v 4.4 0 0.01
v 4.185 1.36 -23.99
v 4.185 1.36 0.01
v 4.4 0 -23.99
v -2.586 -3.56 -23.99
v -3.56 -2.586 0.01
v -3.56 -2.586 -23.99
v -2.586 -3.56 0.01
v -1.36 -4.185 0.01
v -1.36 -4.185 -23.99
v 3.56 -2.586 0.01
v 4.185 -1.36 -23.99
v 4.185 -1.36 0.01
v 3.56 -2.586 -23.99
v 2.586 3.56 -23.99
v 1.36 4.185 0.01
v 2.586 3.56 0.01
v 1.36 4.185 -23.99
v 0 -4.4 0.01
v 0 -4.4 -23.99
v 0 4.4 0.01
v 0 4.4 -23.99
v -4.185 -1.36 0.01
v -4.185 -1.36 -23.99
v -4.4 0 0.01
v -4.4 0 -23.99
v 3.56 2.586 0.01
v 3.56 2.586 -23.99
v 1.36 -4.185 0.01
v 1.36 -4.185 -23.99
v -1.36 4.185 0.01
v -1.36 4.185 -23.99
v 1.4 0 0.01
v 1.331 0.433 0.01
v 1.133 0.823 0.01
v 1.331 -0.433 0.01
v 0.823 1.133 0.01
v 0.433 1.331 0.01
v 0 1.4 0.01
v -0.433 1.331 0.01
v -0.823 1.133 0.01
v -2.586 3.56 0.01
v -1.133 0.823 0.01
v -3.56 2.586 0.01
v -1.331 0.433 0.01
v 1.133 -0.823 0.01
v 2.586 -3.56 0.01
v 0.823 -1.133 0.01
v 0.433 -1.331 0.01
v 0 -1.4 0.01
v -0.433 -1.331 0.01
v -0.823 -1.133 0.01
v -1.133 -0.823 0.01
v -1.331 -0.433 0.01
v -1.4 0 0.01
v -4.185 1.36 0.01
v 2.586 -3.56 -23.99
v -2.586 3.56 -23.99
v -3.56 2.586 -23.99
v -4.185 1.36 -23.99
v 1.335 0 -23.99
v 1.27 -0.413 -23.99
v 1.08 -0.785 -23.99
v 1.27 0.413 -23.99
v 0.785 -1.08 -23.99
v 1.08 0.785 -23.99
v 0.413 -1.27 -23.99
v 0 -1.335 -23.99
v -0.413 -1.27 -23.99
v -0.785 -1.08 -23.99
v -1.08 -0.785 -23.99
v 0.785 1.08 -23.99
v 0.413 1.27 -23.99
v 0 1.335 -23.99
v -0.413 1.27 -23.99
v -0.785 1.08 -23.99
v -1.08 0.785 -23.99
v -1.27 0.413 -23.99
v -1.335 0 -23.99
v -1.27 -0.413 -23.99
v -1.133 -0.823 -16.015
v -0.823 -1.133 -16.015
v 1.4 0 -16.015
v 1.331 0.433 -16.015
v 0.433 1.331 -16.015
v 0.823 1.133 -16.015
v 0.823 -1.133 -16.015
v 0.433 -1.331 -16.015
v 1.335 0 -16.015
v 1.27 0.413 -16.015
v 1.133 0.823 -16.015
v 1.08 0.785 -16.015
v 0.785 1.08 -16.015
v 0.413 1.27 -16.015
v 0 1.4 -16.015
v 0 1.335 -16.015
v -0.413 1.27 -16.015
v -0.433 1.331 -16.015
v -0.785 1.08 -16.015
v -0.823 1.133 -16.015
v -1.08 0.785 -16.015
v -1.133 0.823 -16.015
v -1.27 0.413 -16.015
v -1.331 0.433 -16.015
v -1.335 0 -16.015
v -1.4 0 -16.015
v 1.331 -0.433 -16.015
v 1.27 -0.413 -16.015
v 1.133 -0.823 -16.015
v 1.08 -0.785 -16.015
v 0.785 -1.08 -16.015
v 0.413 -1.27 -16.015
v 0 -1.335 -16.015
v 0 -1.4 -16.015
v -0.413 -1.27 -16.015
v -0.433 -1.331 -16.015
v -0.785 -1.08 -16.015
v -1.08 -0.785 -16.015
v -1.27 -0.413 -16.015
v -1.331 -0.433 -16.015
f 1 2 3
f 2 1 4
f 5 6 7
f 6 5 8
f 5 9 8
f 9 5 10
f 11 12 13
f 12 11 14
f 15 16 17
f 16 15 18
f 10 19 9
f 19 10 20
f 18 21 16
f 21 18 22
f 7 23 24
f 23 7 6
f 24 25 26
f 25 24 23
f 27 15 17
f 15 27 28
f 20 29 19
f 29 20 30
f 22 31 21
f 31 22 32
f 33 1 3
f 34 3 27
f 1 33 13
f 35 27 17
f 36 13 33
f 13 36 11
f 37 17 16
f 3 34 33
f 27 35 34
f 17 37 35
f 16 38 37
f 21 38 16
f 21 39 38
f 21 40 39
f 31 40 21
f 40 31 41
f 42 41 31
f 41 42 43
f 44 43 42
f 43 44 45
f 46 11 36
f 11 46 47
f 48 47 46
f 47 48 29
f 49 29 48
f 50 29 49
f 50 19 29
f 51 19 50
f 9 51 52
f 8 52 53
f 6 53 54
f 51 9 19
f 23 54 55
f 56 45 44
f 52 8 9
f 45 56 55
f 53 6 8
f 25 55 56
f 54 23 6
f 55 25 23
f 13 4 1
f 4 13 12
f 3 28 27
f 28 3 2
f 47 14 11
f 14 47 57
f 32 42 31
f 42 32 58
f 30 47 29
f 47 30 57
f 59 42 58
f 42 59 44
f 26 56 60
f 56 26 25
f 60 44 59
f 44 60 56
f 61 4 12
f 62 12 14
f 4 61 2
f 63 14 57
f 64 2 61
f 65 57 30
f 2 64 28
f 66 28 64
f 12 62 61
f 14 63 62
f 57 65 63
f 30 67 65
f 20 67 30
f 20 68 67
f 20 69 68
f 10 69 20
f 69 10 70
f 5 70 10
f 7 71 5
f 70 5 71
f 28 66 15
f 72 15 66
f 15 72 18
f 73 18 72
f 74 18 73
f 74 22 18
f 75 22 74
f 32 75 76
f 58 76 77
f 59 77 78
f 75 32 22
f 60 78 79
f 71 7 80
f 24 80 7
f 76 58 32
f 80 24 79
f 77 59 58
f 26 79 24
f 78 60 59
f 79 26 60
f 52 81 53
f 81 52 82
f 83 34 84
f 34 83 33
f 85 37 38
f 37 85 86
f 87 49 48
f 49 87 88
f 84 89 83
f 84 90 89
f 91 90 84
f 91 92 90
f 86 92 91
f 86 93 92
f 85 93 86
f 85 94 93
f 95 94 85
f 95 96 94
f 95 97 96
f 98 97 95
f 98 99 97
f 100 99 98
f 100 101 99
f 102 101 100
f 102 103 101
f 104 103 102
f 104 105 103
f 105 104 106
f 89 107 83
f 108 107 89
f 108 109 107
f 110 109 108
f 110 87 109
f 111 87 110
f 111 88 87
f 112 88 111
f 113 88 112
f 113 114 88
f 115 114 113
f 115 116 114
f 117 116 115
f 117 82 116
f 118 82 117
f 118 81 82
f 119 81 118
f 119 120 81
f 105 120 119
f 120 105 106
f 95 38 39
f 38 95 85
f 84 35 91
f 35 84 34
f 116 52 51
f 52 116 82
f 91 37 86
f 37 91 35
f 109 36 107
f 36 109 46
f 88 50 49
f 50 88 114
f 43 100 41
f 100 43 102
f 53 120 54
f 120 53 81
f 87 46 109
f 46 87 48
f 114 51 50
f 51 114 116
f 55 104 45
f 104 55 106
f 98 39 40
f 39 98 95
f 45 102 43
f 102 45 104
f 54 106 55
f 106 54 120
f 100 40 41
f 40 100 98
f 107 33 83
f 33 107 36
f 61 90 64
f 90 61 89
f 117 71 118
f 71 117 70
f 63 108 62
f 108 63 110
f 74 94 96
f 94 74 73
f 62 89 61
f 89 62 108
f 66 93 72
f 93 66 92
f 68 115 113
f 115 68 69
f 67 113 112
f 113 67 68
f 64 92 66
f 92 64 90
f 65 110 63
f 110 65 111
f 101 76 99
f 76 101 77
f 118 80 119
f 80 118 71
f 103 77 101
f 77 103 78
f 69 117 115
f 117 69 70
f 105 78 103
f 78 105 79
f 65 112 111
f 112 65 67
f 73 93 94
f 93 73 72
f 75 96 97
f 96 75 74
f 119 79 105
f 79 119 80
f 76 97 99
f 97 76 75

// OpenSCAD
// Start: lazy_union
default_5_default_5();
// End: lazy_union

// Modules.

// 'PartMaterial undef-default - default 5.0'
module default_5_default_5() {
  // 'None : _combine_solids_and_holes'
  union() {
    // '_combine_solids_and_holes'
    difference() {
      // 'default : _combine_solids_and_holes'
      union() {
        // 'thru'
        multmatrix(m=[[1.0, 0.0, 0.0, 0.0], [0.0, -1.0, 0.0, 0.0], [0.0, 0.0, -1.0, -8.0], [0.0, 0.0, 0.0, 1.0]]) {
          // 'outer'
          multmatrix(m=[[1.0, 0.0, 0.0, 0.0], [-0.0, -1.0, -0.0, -0.0], [-0.0, -0.0, -1.0, 8.01], [0.0, 0.0, 0.0, 1.0]]) {
            // 'outer : _combine_solids_and_holes'
            union() {
              // 'pie : _combine_solids_and_holes'
              union() {
                // 'pie'
                polyhedron(points=[[0.0, 0.0, 0.0], [0.0, 0.0, 16.02], [4.4, 0.0, 16.02], [4.4, 0.0, 0.0], [0.0, 0.0, 0.0], [0.0, 0.0, 16.02], [4.1846486716986755, 1.3596747752497687, 16.02], [4.1846486716986755, 1.3596747752497687, 0.0], [0.0, 0.0, 0.0], [0.0, 0.0, 16.02], [3.559674775249769, 2.586255110086882, 16.02], [3.559674775249769, 2.586255110086882, 0.0], [0.0, 0.0, 0.0], [0.0, 0.0, 16.02], [2.586255110086882, 3.559674775249769, 16.02], [2.586255110086882, 3.559674775249769, 0.0], [0.0, 0.0, 0.0], [0.0, 0.0, 16.02], [1.3596747752497689, 4.1846486716986755, 16.02], [1.3596747752497689, 4.1846486716986755, 0.0], [0.0, 0.0, 0.0], [0.0, 0.0, 16.02], [0.0, 4.4, 16.02], [0.0, 4.4, 0.0], [0.0, 0.0, 0.0], [0.0, 0.0, 16.02], [-1.3596747752497684, 4.184648671698676, 16.02], [-1.3596747752497684, 4.184648671698676, 0.0], [0.0, 0.0, 0.0], [0.0, 0.0, 16.02], [-2.5862551100868814, 3.559674775249769, 16.02], [-2.5862551100868814, 3.559674775249769, 0.0], [0.0, 0.0, 0.0], [0.0, 0.0, 16.02], [-3.5596747752497686, 2.5862551100868827, 16.02], [-3.5596747752497686, 2.5862551100868827, 0.0], [0.0, 0.0, 0.0], [0.0, 0.0, 16.02], [-4.1846486716986755, 1.359674775249769, 16.02], [-4.1846486716986755, 1.359674775249769, 0.0], [0.0, 0.0, 0.0], [0.0, 0.0, 16.02], [-4.4, 0.0, 16.02], [-4.4, 0.0, 0.0], [0.0, 0.0, 0.0], [0.0, 0.0, 16.02], [-4.184648671698676, -1.3596747752497682, 16.02], [-4.184648671698676, -1.3596747752497682, 0.0], [0.0, 0.0, 0.0], [0.0, 0.0, 16.02], [-3.559674775249769, -2.5862551100868814, 16.02], [-3.559674775249769, -2.5862551100868814, 0.0], [0.0, 0.0, 0.0], [0.0, 0.0, 16.02], [-2.5862551100868827, -3.5596747752497686, 16.02], [-2.5862551100868827, -3.5596747752497686, 0.0], [0.0, 0.0, 0.0], [0.0, 0.0, 16.02], [-1.3596747752497693, -4.1846486716986755, 16.02], [-1.3596747752497693, -4.1846486716986755, 0.0], [0.0, 0.0, 0.0], [0.0, 0.0, 16.02], [0.0, -4.4, 16.02], [0.0, -4.4, 0.0], [0.0, 0.0, 0.0], [0.0, 0.0, 16.02], [1.359674775249768, -4.184648671698676, 16.02], [1.359674775249768, -4.184648671698676, 0.0], [0.0, 0.0, 0.0], [0.0, 0.0, 16.02], [2.586255110086881, -3.5596747752497695, 16.02], [2.586255110086881, -3.5596747752497695, 0.0], [0.0, 0.0, 0.0], [0.0, 0.0, 16.02], [3.5596747752497686, -2.586255110086883, 16.02], [3.5596747752497686, -2.586255110086883, 0.0], [0.0, 0.0, 0.0], [0.0, 0.0, 16.02], [4.1846486716986755, -1.3596747752497698, 16.02], [4.1846486716986755, -1.3596747752497698, 0.0], [0.0, 0.0, 0.0], [0.0, 0.0, 16.02], [4.4, 0.0, 16.02], [4.4, 0.0, 0.0]], faces=[[0, 4, 5, 1], [1, 5, 6, 2], [2, 6, 7, 3], [3, 7, 4, 0], [4, 8, 9, 5], [5, 9, 10, 6], [6, 10, 11, 7], [7, 11, 8, 4], [8, 12, 13, 9], [9, 13, 14, 10], [10, 14, 15, 11], [11, 15, 12, 8], [12, 16, 17, 13], [13, 17, 18, 14], [14, 18, 19, 15], [15, 19, 16, 12], [16, 20, 21, 17], [17, 21, 22, 18], [18, 22, 23, 19], [19, 23, 20, 16], [20, 24, 25, 21], [21, 25, 26, 22], [22, 26, 27, 23], [23, 27, 24, 20], [24, 28, 29, 25], [25, 29, 30, 26], [26, 30, 31, 27], [27, 31, 28, 24], [28, 32, 33, 29], [29, 33, 34, 30], [30, 34, 35, 31], [31, 35, 32, 28], [32, 36, 37, 33], [33, 37, 38, 34], [34, 38, 39, 35], [35, 39, 36, 32], [36, 40, 41, 37], [37, 41, 42, 38], [38, 42, 43, 39], [39, 43, 40, 36], [40, 44, 45, 41], [41, 45, 46, 42], [42, 46, 47, 43], [43, 47, 44, 40], [44, 48, 49, 45], [45, 49, 50, 46], [46, 50, 51, 47], [47, 51, 48, 44], [48, 52, 53, 49], [49, 53, 54, 50], [50, 54, 55, 51], [51, 55, 52, 48], [52, 56, 57, 53], [53, 57, 58, 54], [54, 58, 59, 55], [55, 59, 56, 52], [56, 60, 61, 57], [57, 61, 62, 58], [58, 62, 63, 59], [59, 63, 60, 56], [60, 64, 65, 61], [61, 65, 66, 62], [62, 66, 67, 63], [63, 67, 64, 60], [64, 68, 69, 65], [65, 69, 70, 66], [66, 70, 71, 67], [67, 71, 68, 64], [68, 72, 73, 69], [69, 73, 74, 70], [70, 74, 75, 71], [71, 75, 72, 68], [72, 76, 77, 73], [73, 77, 78, 74], [74, 78, 79, 75], [75, 79, 76, 72], [76, 80, 81, 77], [77, 81, 82, 78], [78, 82, 83, 79], [79, 83, 80, 76], [80, 0, 1, 81], [81, 1, 2, 82], [82, 2, 3, 83], [83, 3, 0, 80]], convexity=10);
              }
            }
          }
        }
        // 'tap'
        multmatrix(m=[[1.0, 0.0, 0.0, 0.0], [0.0, -1.0, 0.0, 0.0], [0.0, 0.0, -1.0, -19.979999999999997], [0.0, 0.0, 0.0, 1.0]]) {
          // 'outer'
          multmatrix(m=[[1.0, 0.0, 0.0, 0.0], [-0.0, -1.0, -0.0, -0.0], [-0.0, -0.0, -1.0, 4.01], [0.0, 0.0, 0.0, 1.0]]) {
            // 'outer : _combine_solids_and_holes'
            union() {
              // 'pie : _combine_solids_and_holes'
              union() {
                // 'pie'
                polyhedron(points=[[0.0, 0.0, 0.0], [0.0, 0.0, 8.02], [4.4, 0.0, 8.02], [4.4, 0.0, 0.0], [0.0, 0.0, 0.0], [0.0, 0.0, 8.02], [4.1846486716986755, 1.3596747752497687, 8.02], [4.1846486716986755, 1.3596747752497687, 0.0], [0.0, 0.0, 0.0], [0.0, 0.0, 8.02], [3.559674775249769, 2.586255110086882, 8.02], [3.559674775249769, 2.586255110086882, 0.0], [0.0, 0.0, 0.0], [0.0, 0.0, 8.02], [2.586255110086882, 3.559674775249769, 8.02], [2.586255110086882, 3.559674775249769, 0.0], [0.0, 0.0, 0.0], [0.0, 0.0, 8.02], [1.3596747752497689, 4.1846486716986755, 8.02], [1.3596747752497689, 4.1846486716986755, 0.0], [0.0, 0.0, 0.0], [0.0, 0.0, 8.02], [0.0, 4.4, 8.02], [0.0, 4.4, 0.0], [0.0, 0.0, 0.0], [0.0, 0.0, 8.02], [-1.3596747752497684, 4.184648671698676, 8.02], [-1.3596747752497684, 4.184648671698676, 0.0], [0.0, 0.0, 0.0], [0.0, 0.0, 8.02], [-2.5862551100868814, 3.559674775249769, 8.02], [-2.5862551100868814, 3.559674775249769, 0.0], [0.0, 0.0, 0.0], [0.0, 0.0, 8.02], [-3.5596747752497686, 2.5862551100868827, 8.02], [-3.5596747752497686, 2.5862551100868827, 0.0], [0.0, 0.0, 0.0], [0.0, 0.0, 8.02], [-4.1846486716986755, 1.359674775249769, 8.02], [-4.1846486716986755, 1.359674775249769, 0.0], [0.0, 0.0, 0.0], [0.0, 0.0, 8.02], [-4.4, 0.0, 8.02], [-4.4, 0.0, 0.0], [0.0, 0.0, 0.0], [0.0, 0.0, 8.02], [-4.184648671698676, -1.3596747752497682, 8.02], [-4.184648671698676, -1.3596747752497682, 0.0], [0.0, 0.0, 0.0], [0.0, 0.0, 8.02], [-3.559674775249769, -2.5862551100868814, 8.02], [-3.559674775249769, -2.5862551100868814, 0.0], [0.0, 0.0, 0.0], [0.0, 0.0, 8.02], [-2.5862551100868827, -3.5596747752497686, 8.02], [-2.5862551100868827, -3.5596747752497686, 0.0], [0.0, 0.0, 0.0], [0.0, 0.0, 8.02], [-1.3596747752497693, -4.1846486716986755, 8.02], [-1.3596747752497693, -4.1846486716986755, 0.0], [0.0, 0.0, 0.0], [0.0, 0.0, 8.02], [0.0, -4.4, 8.02], [0.0, -4.4, 0.0], [0.0, 0.0, 0.0], [0.0, 0.0, 8.02], [1.359674775249768, -4.184648671698676, 8.02], [1.359674775249768, -4.184648671698676, 0.0], [0.0, 0.0, 0.0], [0.0, 0.0, 8.02], [2.586255110086881, -3.5596747752497695, 8.02], [2.586255110086881, -3.5596747752497695, 0.0], [0.0, 0.0, 0.0], [0.0, 0.0, 8.02], [3.5596747752497686, -2.586255110086883, 8.02], [3.5596747752497686, -2.586255110086883, 0.0], [0.0, 0.0, 0.0], [0.0, 0.0, 8.02], [4.1846486716986755, -1.3596747752497698, 8.02], [4.1846486716986755, -1.3596747752497698, 0.0], [0.0, 0.0, 0.0], [0.0, 0.0, 8.02], [4.4, 0.0, 8.02], [4.4, 0.0, 0.0]], faces=[[0, 4, 5, 1], [1, 5, 6, 2], [2, 6, 7, 3], [3, 7, 4, 0], [4, 8, 9, 5], [5, 9, 10, 6], [6, 10, 11, 7], [7, 11, 8, 4], [8, 12, 13, 9], [9, 13, 14, 10], [10, 14, 15, 11], [11, 15, 12, 8], [12, 16, 17, 13], [13, 17, 18, 14], [14, 18, 19, 15], [15, 19, 16, 12], [16, 20, 21, 17], [17, 21, 22, 18], [18, 22, 23, 19], [19, 23, 20, 16], [20, 24, 25, 21], [21, 25, 26, 22], [22, 26, 27, 23], [23, 27, 24, 20], [24, 28, 29, 25], [25, 29, 30, 26], [26, 30, 31, 27], [27, 31, 28, 24], [28, 32, 33, 29], [29, 33, 34, 30], [30, 34, 35, 31], [31, 35, 32, 28], [32, 36, 37, 33], [33, 37, 38, 34], [34, 38, 39, 35], [35, 39, 36, 32], [36, 40, 41, 37], [37, 41, 42, 38], [38, 42, 43, 39], [39, 43, 40, 36], [40, 44, 45, 41], [41, 45, 46, 42], [42, 46, 47, 43], [43, 47, 44, 40], [44, 48, 49, 45], [45, 49, 50, 46], [46, 50, 51, 47], [47, 51, 48, 44], [48, 52, 53, 49], [49, 53, 54, 50], [50, 54, 55, 51], [51, 55, 52, 48], [52, 56, 57, 53], [53, 57, 58, 54], [54, 58, 59, 55], [55, 59, 56, 52], [56, 60, 61, 57], [57, 61, 62, 58], [58, 62, 63, 59], [59, 63, 60, 56], [60, 64, 65, 61], [61, 65, 66, 62], [62, 66, 67, 63], [63, 67, 64, 60], [64, 68, 69, 65], [65, 69, 70, 66], [66, 70, 71, 67], [67, 71, 68, 64], [68, 72, 73, 69], [69, 73, 74, 70], [70, 74, 75, 71], [71, 75, 72, 68], [72, 76, 77, 73], [73, 77, 78, 74], [74, 78, 79, 75], [75, 79, 76, 72], [76, 80, 81, 77], [77, 81, 82, 78], [78, 82, 83, 79], [79, 83, 80, 76], [80, 0, 1, 81], [81, 1, 2, 82], [82, 2, 3, 83], [83, 3, 0, 80]], convexity=10);
              }
            }
          }
        }
      }
      // 'thru'
      multmatrix(m=[[1.0, 0.0, 0.0, 0.0], [0.0, -1.0, 0.0, 0.0], [0.0, 0.0, -1.0, -8.0], [0.0, 0.0, 0.0, 1.0]]) {
        // 'thru'
        multmatrix(m=[[1.0, 0.0, 0.0, 0.0], [-0.0, -1.0, -0.0, -0.0], [-0.0, -0.0, -1.0, 8.015], [0.0, 0.0, 0.0, 1.0]]) {
          // 'inner : _combine_solids_and_holes'
          union() {
            // 'pie : _combine_solids_and_holes'
            union() {
              // 'pie'
              polyhedron(points=[[0.0, 0.0, 0.0], [0.0, 0.0, 16.03], [1.4, 0.0, 16.03], [1.4, 0.0, 0.0], [0.0, 0.0, 0.0], [0.0, 0.0, 16.03], [1.3314791228132148, 0.43262379212492635, 16.03], [1.3314791228132148, 0.43262379212492635, 0.0], [0.0, 0.0, 0.0], [0.0, 0.0, 16.03], [1.1326237921249263, 0.8228993532094624, 16.03], [1.1326237921249263, 0.8228993532094624, 0.0], [0.0, 0.0, 0.0], [0.0, 0.0, 16.03], [0.8228993532094624, 1.1326237921249263, 16.03], [0.8228993532094624, 1.1326237921249263, 0.0], [0.0, 0.0, 0.0], [0.0, 0.0, 16.03], [0.4326237921249264, 1.3314791228132148, 16.03], [0.4326237921249264, 1.3314791228132148, 0.0], [0.0, 0.0, 0.0], [0.0, 0.0, 16.03], [0.0, 1.4, 16.03], [0.0, 1.4, 0.0], [0.0, 0.0, 0.0], [0.0, 0.0, 16.03], [-0.43262379212492624, 1.331479122813215, 16.03], [-0.43262379212492624, 1.331479122813215, 0.0], [0.0, 0.0, 0.0], [0.0, 0.0, 16.03], [-0.8228993532094622, 1.1326237921249263, 16.03], [-0.8228993532094622, 1.1326237921249263, 0.0], [0.0, 0.0, 0.0], [0.0, 0.0, 16.03], [-1.1326237921249263, 0.8228993532094625, 16.03], [-1.1326237921249263, 0.8228993532094625, 0.0], [0.0, 0.0, 0.0], [0.0, 0.0, 16.03], [-1.3314791228132148, 0.43262379212492647, 16.03], [-1.3314791228132148, 0.43262379212492647, 0.0], [0.0, 0.0, 0.0], [0.0, 0.0, 16.03], [-1.4, 0.0, 16.03], [-1.4, 0.0, 0.0], [0.0, 0.0, 0.0], [0.0, 0.0, 16.03], [-1.331479122813215, -0.4326237921249262, 16.03], [-1.331479122813215, -0.4326237921249262, 0.0], [0.0, 0.0, 0.0], [0.0, 0.0, 16.03], [-1.1326237921249263, -0.8228993532094622, 16.03], [-1.1326237921249263, -0.8228993532094622, 0.0], [0.0, 0.0, 0.0], [0.0, 0.0, 16.03], [-0.8228993532094625, -1.1326237921249263, 16.03], [-0.8228993532094625, -1.1326237921249263, 0.0], [0.0, 0.0, 0.0], [0.0, 0.0, 16.03], [-0.4326237921249266, -1.3314791228132148, 16.03], [-0.4326237921249266, -1.3314791228132148, 0.0], [0.0, 0.0, 0.0], [0.0, 0.0, 16.03], [0.0, -1.4, 16.03], [0.0, -1.4, 0.0], [0.0, 0.0, 0.0], [0.0, 0.0, 16.03], [0.4326237921249261, -1.331479122813215, 16.03], [0.4326237921249261, -1.331479122813215, 0.0], [0.0, 0.0, 0.0], [0.0, 0.0, 16.03], [0.8228993532094621, -1.1326237921249265, 16.03], [0.8228993532094621, -1.1326237921249265, 0.0], [0.0, 0.0, 0.0], [0.0, 0.0, 16.03], [1.1326237921249263, -0.8228993532094626, 16.03], [1.1326237921249263, -0.8228993532094626, 0.0], [0.0, 0.0, 0.0], [0.0, 0.0, 16.03], [1.3314791228132148, -0.43262379212492674, 16.03], [1.3314791228132148, -0.43262379212492674, 0.0], [0.0, 0.0, 0.0], [0.0, 0.0, 16.03], [1.4, 0.0, 16.03], [1.4, 0.0, 0.0]], faces=[[0, 4, 5, 1], [1, 5, 6, 2], [2, 6, 7, 3], [3, 7, 4, 0], [4, 8, 9, 5], [5, 9, 10, 6], [6, 10, 11, 7], [7, 11, 8, 4], [8, 12, 13, 9], [9, 13, 14, 10], [10, 14, 15, 11], [11, 15, 12, 8], [12, 16, 17, 13], [13, 17, 18, 14], [14, 18, 19, 15], [15, 19, 16, 12], [16, 20, 21, 17], [17, 21, 22, 18], [18, 22, 23, 19], [19, 23, 20, 16], [20, 24, 25, 21], [21, 25, 26, 22], [22, 26, 27, 23], [23, 27, 24, 20], [24, 28, 29, 25], [25, 29, 30, 26], [26, 30, 31, 27], [27, 31, 28, 24], [28, 32, 33, 29], [29, 33, 34, 30], [30, 34, 35, 31], [31, 35, 32, 28], [32, 36, 37, 33], [33, 37, 38, 34], [34, 38, 39, 35], [35, 39, 36, 32], [36, 40, 41, 37], [37, 41, 42, 38], [38, 42, 43, 39], [39, 43, 40, 36], [40, 44, 45, 41], [41, 45, 46, 42], [42, 46, 47, 43], [43, 47, 44, 40], [44, 48, 49, 45], [45, 49, 50, 46], [46, 50, 51, 47], [47, 51, 48, 44], [48, 52, 53, 49], [49, 53, 54, 50], [50, 54, 55, 51], [51, 55, 52, 48], [52, 56, 57, 53], [53, 57, 58, 54], [54, 58, 59, 55], [55, 59, 56, 52], [56, 60, 61, 57], [57, 61, 62, 58], [58, 62, 63, 59], [59, 63, 60, 56], [60, 64, 65, 61], [61, 65, 66, 62], [62, 66, 67, 63], [63, 67, 64, 60], [64, 68, 69, 65], [65, 69, 70, 66], [66, 70, 71, 67], [67, 71, 68, 64], [68, 72, 73, 69], [69, 73, 74, 70], [70, 74, 75, 71], [71, 75, 72, 68], [72, 76, 77, 73], [73, 77, 78, 74], [74, 78, 79, 75], [75, 79, 76, 72], [76, 80, 81, 77], [77, 81, 82, 78], [78, 82, 83, 79], [79, 83, 80, 76], [80, 0, 1, 81], [81, 1, 2, 82], [82, 2, 3, 83], [83, 3, 0, 80]], convexity=10);
            }
          }
        }
      }
      // 'tap'
      multmatrix(m=[[1.0, 0.0, 0.0, 0.0], [0.0, -1.0, 0.0, 0.0], [0.0, 0.0, -1.0, -19.979999999999997], [0.0, 0.0, 0.0, 1.0]]) {
        // 'tap'
        multmatrix(m=[[1.0, 0.0, 0.0, 0.0], [-0.0, -1.0, -0.0, -0.0], [-0.0, -0.0, -1.0, 4.015], [0.0, 0.0, 0.0, 1.0]]) {
          // 'inner : _combine_solids_and_holes'
          union() {
            // 'pie : _combine_solids_and_holes'
            union() {
              // 'pie'
              polyhedron(points=[[0.0, 0.0, 0.0], [0.0, 0.0, 8.03], [1.335, 0.0, 8.03], [1.335, 0.0, 0.0], [0.0, 0.0, 0.0], [0.0, 0.0, 8.03], [1.26966044925403, 0.41253768749055475, 8.03], [1.26966044925403, 0.41253768749055475, 0.0], [0.0, 0.0, 0.0], [0.0, 0.0, 8.03], [1.0800376874905548, 0.7846933118104517, 8.03], [1.0800376874905548, 0.7846933118104517, 0.0], [0.0, 0.0, 0.0], [0.0, 0.0, 8.03], [0.7846933118104517, 1.0800376874905548, 8.03], [0.7846933118104517, 1.0800376874905548, 0.0], [0.0, 0.0, 0.0], [0.0, 0.0, 8.03], [0.41253768749055486, 1.26966044925403, 8.03], [0.41253768749055486, 1.26966044925403, 0.0], [0.0, 0.0, 0.0], [0.0, 0.0, 8.03], [0.0, 1.335, 8.03], [0.0, 1.335, 0.0], [0.0, 0.0, 0.0], [0.0, 0.0, 8.03], [-0.4125376874905547, 1.26966044925403, 8.03], [-0.4125376874905547, 1.26966044925403, 0.0], [0.0, 0.0, 0.0], [0.0, 0.0, 8.03], [-0.7846933118104514, 1.0800376874905548, 8.03], [-0.7846933118104514, 1.0800376874905548, 0.0], [0.0, 0.0, 0.0], [0.0, 0.0, 8.03], [-1.0800376874905546, 0.7846933118104518, 8.03], [-1.0800376874905546, 0.7846933118104518, 0.0], [0.0, 0.0, 0.0], [0.0, 0.0, 8.03], [-1.26966044925403, 0.4125376874905549, 8.03], [-1.26966044925403, 0.4125376874905549, 0.0], [0.0, 0.0, 0.0], [0.0, 0.0, 8.03], [-1.335, 0.0, 8.03], [-1.335, 0.0, 0.0], [0.0, 0.0, 0.0], [0.0, 0.0, 8.03], [-1.26966044925403, -0.41253768749055464, 8.03], [-1.26966044925403, -0.41253768749055464, 0.0], [0.0, 0.0, 0.0], [0.0, 0.0, 8.03], [-1.0800376874905548, -0.7846933118104514, 8.03], [-1.0800376874905548, -0.7846933118104514, 0.0], [0.0, 0.0, 0.0], [0.0, 0.0, 8.03], [-0.7846933118104518, -1.0800376874905546, 8.03], [-0.7846933118104518, -1.0800376874905546, 0.0], [0.0, 0.0, 0.0], [0.0, 0.0, 8.03], [-0.41253768749055497, -1.26966044925403, 8.03], [-0.41253768749055497, -1.26966044925403, 0.0], [0.0, 0.0, 0.0], [0.0, 0.0, 8.03], [0.0, -1.335, 8.03], [0.0, -1.335, 0.0], [0.0, 0.0, 0.0], [0.0, 0.0, 8.03], [0.4125376874905545, -1.26966044925403, 8.03], [0.4125376874905545, -1.26966044925403, 0.0], [0.0, 0.0, 0.0], [0.0, 0.0, 8.03], [0.7846933118104513, -1.080037687490555, 8.03], [0.7846933118104513, -1.080037687490555, 0.0], [0.0, 0.0, 0.0], [0.0, 0.0, 8.03], [1.0800376874905546, -0.7846933118104519, 8.03], [1.0800376874905546, -0.7846933118104519, 0.0], [0.0, 0.0, 0.0], [0.0, 0.0, 8.03], [1.26966044925403, -0.41253768749055514, 8.03], [1.26966044925403, -0.41253768749055514, 0.0], [0.0, 0.0, 0.0], [0.0, 0.0, 8.03], [1.335, 0.0, 8.03], [1.335, 0.0, 0.0]], faces=[[0, 4, 5, 1], [1, 5, 6, 2], [2, 6, 7, 3], [3, 7, 4, 0], [4, 8, 9, 5], [5, 9, 10, 6], [6, 10, 11, 7], [7, 11, 8, 4], [8, 12, 13, 9], [9, 13, 14, 10], [10, 14, 15, 11], [11, 15, 12, 8], [12, 16, 17, 13], [13, 17, 18, 14], [14, 18, 19, 15], [15, 19, 16, 12], [16, 20, 21, 17], [17, 21, 22, 18], [18, 22, 23, 19], [19, 23, 20, 16], [20, 24, 25, 21], [21, 25, 26, 22], [22, 26, 27, 23], [23, 27, 24, 20], [24, 28, 29, 25], [25, 29, 30, 26], [26, 30, 31, 27], [27, 31, 28, 24], [28, 32, 33, 29], [29, 33, 34, 30], [30, 34, 35, 31], [31, 35, 32, 28], [32, 36, 37, 33], [33, 37, 38, 34], [34, 38, 39, 35], [35, 39, 36, 32], [36, 40, 41, 37], [37, 41, 42, 38], [38, 42, 43, 39], [39, 43, 40, 36], [40, 44, 45, 41], [41, 45, 46, 42], [42, 46, 47, 43], [43, 47, 44, 40], [44, 48, 49, 45], [45, 49, 50, 46], [46, 50, 51, 47], [47, 51, 48, 44], [48, 52, 53, 49], [49, 53, 54, 50], [50, 54, 55, 51], [51, 55, 52, 48], [52, 56, 57, 53], [53, 57, 58, 54], [54, 58, 59, 55], [55, 59, 56, 52], [56, 60, 61, 57], [57, 61, 62, 58], [58, 62, 63, 59], [59, 63, 60, 56], [60, 64, 65, 61], [61, 65, 66, 62], [62, 66, 67, 63], [63, 67, 64, 60], [64, 68, 69, 65], [65, 69, 70, 66], [66, 70, 71, 67], [67, 71, 68, 64], [68, 72, 73, 69], [69, 73, 74, 70], [70, 74, 75, 71], [71, 75, 72, 68], [72, 76, 77, 73], [73, 77, 78, 74], [74, 78, 79, 75], [75, 79, 76, 72], [76, 80, 81, 77], [77, 81, 82, 78], [78, 82, 83, 79], [79, 83, 80, 76], [80, 0, 1, 81], [81, 1, 2, 82], [82, 2, 3, 83], [83, 3, 0, 80]], convexity=10);
            }
          }
        }
      }
    }
  }
} // end module default_5_default_5
